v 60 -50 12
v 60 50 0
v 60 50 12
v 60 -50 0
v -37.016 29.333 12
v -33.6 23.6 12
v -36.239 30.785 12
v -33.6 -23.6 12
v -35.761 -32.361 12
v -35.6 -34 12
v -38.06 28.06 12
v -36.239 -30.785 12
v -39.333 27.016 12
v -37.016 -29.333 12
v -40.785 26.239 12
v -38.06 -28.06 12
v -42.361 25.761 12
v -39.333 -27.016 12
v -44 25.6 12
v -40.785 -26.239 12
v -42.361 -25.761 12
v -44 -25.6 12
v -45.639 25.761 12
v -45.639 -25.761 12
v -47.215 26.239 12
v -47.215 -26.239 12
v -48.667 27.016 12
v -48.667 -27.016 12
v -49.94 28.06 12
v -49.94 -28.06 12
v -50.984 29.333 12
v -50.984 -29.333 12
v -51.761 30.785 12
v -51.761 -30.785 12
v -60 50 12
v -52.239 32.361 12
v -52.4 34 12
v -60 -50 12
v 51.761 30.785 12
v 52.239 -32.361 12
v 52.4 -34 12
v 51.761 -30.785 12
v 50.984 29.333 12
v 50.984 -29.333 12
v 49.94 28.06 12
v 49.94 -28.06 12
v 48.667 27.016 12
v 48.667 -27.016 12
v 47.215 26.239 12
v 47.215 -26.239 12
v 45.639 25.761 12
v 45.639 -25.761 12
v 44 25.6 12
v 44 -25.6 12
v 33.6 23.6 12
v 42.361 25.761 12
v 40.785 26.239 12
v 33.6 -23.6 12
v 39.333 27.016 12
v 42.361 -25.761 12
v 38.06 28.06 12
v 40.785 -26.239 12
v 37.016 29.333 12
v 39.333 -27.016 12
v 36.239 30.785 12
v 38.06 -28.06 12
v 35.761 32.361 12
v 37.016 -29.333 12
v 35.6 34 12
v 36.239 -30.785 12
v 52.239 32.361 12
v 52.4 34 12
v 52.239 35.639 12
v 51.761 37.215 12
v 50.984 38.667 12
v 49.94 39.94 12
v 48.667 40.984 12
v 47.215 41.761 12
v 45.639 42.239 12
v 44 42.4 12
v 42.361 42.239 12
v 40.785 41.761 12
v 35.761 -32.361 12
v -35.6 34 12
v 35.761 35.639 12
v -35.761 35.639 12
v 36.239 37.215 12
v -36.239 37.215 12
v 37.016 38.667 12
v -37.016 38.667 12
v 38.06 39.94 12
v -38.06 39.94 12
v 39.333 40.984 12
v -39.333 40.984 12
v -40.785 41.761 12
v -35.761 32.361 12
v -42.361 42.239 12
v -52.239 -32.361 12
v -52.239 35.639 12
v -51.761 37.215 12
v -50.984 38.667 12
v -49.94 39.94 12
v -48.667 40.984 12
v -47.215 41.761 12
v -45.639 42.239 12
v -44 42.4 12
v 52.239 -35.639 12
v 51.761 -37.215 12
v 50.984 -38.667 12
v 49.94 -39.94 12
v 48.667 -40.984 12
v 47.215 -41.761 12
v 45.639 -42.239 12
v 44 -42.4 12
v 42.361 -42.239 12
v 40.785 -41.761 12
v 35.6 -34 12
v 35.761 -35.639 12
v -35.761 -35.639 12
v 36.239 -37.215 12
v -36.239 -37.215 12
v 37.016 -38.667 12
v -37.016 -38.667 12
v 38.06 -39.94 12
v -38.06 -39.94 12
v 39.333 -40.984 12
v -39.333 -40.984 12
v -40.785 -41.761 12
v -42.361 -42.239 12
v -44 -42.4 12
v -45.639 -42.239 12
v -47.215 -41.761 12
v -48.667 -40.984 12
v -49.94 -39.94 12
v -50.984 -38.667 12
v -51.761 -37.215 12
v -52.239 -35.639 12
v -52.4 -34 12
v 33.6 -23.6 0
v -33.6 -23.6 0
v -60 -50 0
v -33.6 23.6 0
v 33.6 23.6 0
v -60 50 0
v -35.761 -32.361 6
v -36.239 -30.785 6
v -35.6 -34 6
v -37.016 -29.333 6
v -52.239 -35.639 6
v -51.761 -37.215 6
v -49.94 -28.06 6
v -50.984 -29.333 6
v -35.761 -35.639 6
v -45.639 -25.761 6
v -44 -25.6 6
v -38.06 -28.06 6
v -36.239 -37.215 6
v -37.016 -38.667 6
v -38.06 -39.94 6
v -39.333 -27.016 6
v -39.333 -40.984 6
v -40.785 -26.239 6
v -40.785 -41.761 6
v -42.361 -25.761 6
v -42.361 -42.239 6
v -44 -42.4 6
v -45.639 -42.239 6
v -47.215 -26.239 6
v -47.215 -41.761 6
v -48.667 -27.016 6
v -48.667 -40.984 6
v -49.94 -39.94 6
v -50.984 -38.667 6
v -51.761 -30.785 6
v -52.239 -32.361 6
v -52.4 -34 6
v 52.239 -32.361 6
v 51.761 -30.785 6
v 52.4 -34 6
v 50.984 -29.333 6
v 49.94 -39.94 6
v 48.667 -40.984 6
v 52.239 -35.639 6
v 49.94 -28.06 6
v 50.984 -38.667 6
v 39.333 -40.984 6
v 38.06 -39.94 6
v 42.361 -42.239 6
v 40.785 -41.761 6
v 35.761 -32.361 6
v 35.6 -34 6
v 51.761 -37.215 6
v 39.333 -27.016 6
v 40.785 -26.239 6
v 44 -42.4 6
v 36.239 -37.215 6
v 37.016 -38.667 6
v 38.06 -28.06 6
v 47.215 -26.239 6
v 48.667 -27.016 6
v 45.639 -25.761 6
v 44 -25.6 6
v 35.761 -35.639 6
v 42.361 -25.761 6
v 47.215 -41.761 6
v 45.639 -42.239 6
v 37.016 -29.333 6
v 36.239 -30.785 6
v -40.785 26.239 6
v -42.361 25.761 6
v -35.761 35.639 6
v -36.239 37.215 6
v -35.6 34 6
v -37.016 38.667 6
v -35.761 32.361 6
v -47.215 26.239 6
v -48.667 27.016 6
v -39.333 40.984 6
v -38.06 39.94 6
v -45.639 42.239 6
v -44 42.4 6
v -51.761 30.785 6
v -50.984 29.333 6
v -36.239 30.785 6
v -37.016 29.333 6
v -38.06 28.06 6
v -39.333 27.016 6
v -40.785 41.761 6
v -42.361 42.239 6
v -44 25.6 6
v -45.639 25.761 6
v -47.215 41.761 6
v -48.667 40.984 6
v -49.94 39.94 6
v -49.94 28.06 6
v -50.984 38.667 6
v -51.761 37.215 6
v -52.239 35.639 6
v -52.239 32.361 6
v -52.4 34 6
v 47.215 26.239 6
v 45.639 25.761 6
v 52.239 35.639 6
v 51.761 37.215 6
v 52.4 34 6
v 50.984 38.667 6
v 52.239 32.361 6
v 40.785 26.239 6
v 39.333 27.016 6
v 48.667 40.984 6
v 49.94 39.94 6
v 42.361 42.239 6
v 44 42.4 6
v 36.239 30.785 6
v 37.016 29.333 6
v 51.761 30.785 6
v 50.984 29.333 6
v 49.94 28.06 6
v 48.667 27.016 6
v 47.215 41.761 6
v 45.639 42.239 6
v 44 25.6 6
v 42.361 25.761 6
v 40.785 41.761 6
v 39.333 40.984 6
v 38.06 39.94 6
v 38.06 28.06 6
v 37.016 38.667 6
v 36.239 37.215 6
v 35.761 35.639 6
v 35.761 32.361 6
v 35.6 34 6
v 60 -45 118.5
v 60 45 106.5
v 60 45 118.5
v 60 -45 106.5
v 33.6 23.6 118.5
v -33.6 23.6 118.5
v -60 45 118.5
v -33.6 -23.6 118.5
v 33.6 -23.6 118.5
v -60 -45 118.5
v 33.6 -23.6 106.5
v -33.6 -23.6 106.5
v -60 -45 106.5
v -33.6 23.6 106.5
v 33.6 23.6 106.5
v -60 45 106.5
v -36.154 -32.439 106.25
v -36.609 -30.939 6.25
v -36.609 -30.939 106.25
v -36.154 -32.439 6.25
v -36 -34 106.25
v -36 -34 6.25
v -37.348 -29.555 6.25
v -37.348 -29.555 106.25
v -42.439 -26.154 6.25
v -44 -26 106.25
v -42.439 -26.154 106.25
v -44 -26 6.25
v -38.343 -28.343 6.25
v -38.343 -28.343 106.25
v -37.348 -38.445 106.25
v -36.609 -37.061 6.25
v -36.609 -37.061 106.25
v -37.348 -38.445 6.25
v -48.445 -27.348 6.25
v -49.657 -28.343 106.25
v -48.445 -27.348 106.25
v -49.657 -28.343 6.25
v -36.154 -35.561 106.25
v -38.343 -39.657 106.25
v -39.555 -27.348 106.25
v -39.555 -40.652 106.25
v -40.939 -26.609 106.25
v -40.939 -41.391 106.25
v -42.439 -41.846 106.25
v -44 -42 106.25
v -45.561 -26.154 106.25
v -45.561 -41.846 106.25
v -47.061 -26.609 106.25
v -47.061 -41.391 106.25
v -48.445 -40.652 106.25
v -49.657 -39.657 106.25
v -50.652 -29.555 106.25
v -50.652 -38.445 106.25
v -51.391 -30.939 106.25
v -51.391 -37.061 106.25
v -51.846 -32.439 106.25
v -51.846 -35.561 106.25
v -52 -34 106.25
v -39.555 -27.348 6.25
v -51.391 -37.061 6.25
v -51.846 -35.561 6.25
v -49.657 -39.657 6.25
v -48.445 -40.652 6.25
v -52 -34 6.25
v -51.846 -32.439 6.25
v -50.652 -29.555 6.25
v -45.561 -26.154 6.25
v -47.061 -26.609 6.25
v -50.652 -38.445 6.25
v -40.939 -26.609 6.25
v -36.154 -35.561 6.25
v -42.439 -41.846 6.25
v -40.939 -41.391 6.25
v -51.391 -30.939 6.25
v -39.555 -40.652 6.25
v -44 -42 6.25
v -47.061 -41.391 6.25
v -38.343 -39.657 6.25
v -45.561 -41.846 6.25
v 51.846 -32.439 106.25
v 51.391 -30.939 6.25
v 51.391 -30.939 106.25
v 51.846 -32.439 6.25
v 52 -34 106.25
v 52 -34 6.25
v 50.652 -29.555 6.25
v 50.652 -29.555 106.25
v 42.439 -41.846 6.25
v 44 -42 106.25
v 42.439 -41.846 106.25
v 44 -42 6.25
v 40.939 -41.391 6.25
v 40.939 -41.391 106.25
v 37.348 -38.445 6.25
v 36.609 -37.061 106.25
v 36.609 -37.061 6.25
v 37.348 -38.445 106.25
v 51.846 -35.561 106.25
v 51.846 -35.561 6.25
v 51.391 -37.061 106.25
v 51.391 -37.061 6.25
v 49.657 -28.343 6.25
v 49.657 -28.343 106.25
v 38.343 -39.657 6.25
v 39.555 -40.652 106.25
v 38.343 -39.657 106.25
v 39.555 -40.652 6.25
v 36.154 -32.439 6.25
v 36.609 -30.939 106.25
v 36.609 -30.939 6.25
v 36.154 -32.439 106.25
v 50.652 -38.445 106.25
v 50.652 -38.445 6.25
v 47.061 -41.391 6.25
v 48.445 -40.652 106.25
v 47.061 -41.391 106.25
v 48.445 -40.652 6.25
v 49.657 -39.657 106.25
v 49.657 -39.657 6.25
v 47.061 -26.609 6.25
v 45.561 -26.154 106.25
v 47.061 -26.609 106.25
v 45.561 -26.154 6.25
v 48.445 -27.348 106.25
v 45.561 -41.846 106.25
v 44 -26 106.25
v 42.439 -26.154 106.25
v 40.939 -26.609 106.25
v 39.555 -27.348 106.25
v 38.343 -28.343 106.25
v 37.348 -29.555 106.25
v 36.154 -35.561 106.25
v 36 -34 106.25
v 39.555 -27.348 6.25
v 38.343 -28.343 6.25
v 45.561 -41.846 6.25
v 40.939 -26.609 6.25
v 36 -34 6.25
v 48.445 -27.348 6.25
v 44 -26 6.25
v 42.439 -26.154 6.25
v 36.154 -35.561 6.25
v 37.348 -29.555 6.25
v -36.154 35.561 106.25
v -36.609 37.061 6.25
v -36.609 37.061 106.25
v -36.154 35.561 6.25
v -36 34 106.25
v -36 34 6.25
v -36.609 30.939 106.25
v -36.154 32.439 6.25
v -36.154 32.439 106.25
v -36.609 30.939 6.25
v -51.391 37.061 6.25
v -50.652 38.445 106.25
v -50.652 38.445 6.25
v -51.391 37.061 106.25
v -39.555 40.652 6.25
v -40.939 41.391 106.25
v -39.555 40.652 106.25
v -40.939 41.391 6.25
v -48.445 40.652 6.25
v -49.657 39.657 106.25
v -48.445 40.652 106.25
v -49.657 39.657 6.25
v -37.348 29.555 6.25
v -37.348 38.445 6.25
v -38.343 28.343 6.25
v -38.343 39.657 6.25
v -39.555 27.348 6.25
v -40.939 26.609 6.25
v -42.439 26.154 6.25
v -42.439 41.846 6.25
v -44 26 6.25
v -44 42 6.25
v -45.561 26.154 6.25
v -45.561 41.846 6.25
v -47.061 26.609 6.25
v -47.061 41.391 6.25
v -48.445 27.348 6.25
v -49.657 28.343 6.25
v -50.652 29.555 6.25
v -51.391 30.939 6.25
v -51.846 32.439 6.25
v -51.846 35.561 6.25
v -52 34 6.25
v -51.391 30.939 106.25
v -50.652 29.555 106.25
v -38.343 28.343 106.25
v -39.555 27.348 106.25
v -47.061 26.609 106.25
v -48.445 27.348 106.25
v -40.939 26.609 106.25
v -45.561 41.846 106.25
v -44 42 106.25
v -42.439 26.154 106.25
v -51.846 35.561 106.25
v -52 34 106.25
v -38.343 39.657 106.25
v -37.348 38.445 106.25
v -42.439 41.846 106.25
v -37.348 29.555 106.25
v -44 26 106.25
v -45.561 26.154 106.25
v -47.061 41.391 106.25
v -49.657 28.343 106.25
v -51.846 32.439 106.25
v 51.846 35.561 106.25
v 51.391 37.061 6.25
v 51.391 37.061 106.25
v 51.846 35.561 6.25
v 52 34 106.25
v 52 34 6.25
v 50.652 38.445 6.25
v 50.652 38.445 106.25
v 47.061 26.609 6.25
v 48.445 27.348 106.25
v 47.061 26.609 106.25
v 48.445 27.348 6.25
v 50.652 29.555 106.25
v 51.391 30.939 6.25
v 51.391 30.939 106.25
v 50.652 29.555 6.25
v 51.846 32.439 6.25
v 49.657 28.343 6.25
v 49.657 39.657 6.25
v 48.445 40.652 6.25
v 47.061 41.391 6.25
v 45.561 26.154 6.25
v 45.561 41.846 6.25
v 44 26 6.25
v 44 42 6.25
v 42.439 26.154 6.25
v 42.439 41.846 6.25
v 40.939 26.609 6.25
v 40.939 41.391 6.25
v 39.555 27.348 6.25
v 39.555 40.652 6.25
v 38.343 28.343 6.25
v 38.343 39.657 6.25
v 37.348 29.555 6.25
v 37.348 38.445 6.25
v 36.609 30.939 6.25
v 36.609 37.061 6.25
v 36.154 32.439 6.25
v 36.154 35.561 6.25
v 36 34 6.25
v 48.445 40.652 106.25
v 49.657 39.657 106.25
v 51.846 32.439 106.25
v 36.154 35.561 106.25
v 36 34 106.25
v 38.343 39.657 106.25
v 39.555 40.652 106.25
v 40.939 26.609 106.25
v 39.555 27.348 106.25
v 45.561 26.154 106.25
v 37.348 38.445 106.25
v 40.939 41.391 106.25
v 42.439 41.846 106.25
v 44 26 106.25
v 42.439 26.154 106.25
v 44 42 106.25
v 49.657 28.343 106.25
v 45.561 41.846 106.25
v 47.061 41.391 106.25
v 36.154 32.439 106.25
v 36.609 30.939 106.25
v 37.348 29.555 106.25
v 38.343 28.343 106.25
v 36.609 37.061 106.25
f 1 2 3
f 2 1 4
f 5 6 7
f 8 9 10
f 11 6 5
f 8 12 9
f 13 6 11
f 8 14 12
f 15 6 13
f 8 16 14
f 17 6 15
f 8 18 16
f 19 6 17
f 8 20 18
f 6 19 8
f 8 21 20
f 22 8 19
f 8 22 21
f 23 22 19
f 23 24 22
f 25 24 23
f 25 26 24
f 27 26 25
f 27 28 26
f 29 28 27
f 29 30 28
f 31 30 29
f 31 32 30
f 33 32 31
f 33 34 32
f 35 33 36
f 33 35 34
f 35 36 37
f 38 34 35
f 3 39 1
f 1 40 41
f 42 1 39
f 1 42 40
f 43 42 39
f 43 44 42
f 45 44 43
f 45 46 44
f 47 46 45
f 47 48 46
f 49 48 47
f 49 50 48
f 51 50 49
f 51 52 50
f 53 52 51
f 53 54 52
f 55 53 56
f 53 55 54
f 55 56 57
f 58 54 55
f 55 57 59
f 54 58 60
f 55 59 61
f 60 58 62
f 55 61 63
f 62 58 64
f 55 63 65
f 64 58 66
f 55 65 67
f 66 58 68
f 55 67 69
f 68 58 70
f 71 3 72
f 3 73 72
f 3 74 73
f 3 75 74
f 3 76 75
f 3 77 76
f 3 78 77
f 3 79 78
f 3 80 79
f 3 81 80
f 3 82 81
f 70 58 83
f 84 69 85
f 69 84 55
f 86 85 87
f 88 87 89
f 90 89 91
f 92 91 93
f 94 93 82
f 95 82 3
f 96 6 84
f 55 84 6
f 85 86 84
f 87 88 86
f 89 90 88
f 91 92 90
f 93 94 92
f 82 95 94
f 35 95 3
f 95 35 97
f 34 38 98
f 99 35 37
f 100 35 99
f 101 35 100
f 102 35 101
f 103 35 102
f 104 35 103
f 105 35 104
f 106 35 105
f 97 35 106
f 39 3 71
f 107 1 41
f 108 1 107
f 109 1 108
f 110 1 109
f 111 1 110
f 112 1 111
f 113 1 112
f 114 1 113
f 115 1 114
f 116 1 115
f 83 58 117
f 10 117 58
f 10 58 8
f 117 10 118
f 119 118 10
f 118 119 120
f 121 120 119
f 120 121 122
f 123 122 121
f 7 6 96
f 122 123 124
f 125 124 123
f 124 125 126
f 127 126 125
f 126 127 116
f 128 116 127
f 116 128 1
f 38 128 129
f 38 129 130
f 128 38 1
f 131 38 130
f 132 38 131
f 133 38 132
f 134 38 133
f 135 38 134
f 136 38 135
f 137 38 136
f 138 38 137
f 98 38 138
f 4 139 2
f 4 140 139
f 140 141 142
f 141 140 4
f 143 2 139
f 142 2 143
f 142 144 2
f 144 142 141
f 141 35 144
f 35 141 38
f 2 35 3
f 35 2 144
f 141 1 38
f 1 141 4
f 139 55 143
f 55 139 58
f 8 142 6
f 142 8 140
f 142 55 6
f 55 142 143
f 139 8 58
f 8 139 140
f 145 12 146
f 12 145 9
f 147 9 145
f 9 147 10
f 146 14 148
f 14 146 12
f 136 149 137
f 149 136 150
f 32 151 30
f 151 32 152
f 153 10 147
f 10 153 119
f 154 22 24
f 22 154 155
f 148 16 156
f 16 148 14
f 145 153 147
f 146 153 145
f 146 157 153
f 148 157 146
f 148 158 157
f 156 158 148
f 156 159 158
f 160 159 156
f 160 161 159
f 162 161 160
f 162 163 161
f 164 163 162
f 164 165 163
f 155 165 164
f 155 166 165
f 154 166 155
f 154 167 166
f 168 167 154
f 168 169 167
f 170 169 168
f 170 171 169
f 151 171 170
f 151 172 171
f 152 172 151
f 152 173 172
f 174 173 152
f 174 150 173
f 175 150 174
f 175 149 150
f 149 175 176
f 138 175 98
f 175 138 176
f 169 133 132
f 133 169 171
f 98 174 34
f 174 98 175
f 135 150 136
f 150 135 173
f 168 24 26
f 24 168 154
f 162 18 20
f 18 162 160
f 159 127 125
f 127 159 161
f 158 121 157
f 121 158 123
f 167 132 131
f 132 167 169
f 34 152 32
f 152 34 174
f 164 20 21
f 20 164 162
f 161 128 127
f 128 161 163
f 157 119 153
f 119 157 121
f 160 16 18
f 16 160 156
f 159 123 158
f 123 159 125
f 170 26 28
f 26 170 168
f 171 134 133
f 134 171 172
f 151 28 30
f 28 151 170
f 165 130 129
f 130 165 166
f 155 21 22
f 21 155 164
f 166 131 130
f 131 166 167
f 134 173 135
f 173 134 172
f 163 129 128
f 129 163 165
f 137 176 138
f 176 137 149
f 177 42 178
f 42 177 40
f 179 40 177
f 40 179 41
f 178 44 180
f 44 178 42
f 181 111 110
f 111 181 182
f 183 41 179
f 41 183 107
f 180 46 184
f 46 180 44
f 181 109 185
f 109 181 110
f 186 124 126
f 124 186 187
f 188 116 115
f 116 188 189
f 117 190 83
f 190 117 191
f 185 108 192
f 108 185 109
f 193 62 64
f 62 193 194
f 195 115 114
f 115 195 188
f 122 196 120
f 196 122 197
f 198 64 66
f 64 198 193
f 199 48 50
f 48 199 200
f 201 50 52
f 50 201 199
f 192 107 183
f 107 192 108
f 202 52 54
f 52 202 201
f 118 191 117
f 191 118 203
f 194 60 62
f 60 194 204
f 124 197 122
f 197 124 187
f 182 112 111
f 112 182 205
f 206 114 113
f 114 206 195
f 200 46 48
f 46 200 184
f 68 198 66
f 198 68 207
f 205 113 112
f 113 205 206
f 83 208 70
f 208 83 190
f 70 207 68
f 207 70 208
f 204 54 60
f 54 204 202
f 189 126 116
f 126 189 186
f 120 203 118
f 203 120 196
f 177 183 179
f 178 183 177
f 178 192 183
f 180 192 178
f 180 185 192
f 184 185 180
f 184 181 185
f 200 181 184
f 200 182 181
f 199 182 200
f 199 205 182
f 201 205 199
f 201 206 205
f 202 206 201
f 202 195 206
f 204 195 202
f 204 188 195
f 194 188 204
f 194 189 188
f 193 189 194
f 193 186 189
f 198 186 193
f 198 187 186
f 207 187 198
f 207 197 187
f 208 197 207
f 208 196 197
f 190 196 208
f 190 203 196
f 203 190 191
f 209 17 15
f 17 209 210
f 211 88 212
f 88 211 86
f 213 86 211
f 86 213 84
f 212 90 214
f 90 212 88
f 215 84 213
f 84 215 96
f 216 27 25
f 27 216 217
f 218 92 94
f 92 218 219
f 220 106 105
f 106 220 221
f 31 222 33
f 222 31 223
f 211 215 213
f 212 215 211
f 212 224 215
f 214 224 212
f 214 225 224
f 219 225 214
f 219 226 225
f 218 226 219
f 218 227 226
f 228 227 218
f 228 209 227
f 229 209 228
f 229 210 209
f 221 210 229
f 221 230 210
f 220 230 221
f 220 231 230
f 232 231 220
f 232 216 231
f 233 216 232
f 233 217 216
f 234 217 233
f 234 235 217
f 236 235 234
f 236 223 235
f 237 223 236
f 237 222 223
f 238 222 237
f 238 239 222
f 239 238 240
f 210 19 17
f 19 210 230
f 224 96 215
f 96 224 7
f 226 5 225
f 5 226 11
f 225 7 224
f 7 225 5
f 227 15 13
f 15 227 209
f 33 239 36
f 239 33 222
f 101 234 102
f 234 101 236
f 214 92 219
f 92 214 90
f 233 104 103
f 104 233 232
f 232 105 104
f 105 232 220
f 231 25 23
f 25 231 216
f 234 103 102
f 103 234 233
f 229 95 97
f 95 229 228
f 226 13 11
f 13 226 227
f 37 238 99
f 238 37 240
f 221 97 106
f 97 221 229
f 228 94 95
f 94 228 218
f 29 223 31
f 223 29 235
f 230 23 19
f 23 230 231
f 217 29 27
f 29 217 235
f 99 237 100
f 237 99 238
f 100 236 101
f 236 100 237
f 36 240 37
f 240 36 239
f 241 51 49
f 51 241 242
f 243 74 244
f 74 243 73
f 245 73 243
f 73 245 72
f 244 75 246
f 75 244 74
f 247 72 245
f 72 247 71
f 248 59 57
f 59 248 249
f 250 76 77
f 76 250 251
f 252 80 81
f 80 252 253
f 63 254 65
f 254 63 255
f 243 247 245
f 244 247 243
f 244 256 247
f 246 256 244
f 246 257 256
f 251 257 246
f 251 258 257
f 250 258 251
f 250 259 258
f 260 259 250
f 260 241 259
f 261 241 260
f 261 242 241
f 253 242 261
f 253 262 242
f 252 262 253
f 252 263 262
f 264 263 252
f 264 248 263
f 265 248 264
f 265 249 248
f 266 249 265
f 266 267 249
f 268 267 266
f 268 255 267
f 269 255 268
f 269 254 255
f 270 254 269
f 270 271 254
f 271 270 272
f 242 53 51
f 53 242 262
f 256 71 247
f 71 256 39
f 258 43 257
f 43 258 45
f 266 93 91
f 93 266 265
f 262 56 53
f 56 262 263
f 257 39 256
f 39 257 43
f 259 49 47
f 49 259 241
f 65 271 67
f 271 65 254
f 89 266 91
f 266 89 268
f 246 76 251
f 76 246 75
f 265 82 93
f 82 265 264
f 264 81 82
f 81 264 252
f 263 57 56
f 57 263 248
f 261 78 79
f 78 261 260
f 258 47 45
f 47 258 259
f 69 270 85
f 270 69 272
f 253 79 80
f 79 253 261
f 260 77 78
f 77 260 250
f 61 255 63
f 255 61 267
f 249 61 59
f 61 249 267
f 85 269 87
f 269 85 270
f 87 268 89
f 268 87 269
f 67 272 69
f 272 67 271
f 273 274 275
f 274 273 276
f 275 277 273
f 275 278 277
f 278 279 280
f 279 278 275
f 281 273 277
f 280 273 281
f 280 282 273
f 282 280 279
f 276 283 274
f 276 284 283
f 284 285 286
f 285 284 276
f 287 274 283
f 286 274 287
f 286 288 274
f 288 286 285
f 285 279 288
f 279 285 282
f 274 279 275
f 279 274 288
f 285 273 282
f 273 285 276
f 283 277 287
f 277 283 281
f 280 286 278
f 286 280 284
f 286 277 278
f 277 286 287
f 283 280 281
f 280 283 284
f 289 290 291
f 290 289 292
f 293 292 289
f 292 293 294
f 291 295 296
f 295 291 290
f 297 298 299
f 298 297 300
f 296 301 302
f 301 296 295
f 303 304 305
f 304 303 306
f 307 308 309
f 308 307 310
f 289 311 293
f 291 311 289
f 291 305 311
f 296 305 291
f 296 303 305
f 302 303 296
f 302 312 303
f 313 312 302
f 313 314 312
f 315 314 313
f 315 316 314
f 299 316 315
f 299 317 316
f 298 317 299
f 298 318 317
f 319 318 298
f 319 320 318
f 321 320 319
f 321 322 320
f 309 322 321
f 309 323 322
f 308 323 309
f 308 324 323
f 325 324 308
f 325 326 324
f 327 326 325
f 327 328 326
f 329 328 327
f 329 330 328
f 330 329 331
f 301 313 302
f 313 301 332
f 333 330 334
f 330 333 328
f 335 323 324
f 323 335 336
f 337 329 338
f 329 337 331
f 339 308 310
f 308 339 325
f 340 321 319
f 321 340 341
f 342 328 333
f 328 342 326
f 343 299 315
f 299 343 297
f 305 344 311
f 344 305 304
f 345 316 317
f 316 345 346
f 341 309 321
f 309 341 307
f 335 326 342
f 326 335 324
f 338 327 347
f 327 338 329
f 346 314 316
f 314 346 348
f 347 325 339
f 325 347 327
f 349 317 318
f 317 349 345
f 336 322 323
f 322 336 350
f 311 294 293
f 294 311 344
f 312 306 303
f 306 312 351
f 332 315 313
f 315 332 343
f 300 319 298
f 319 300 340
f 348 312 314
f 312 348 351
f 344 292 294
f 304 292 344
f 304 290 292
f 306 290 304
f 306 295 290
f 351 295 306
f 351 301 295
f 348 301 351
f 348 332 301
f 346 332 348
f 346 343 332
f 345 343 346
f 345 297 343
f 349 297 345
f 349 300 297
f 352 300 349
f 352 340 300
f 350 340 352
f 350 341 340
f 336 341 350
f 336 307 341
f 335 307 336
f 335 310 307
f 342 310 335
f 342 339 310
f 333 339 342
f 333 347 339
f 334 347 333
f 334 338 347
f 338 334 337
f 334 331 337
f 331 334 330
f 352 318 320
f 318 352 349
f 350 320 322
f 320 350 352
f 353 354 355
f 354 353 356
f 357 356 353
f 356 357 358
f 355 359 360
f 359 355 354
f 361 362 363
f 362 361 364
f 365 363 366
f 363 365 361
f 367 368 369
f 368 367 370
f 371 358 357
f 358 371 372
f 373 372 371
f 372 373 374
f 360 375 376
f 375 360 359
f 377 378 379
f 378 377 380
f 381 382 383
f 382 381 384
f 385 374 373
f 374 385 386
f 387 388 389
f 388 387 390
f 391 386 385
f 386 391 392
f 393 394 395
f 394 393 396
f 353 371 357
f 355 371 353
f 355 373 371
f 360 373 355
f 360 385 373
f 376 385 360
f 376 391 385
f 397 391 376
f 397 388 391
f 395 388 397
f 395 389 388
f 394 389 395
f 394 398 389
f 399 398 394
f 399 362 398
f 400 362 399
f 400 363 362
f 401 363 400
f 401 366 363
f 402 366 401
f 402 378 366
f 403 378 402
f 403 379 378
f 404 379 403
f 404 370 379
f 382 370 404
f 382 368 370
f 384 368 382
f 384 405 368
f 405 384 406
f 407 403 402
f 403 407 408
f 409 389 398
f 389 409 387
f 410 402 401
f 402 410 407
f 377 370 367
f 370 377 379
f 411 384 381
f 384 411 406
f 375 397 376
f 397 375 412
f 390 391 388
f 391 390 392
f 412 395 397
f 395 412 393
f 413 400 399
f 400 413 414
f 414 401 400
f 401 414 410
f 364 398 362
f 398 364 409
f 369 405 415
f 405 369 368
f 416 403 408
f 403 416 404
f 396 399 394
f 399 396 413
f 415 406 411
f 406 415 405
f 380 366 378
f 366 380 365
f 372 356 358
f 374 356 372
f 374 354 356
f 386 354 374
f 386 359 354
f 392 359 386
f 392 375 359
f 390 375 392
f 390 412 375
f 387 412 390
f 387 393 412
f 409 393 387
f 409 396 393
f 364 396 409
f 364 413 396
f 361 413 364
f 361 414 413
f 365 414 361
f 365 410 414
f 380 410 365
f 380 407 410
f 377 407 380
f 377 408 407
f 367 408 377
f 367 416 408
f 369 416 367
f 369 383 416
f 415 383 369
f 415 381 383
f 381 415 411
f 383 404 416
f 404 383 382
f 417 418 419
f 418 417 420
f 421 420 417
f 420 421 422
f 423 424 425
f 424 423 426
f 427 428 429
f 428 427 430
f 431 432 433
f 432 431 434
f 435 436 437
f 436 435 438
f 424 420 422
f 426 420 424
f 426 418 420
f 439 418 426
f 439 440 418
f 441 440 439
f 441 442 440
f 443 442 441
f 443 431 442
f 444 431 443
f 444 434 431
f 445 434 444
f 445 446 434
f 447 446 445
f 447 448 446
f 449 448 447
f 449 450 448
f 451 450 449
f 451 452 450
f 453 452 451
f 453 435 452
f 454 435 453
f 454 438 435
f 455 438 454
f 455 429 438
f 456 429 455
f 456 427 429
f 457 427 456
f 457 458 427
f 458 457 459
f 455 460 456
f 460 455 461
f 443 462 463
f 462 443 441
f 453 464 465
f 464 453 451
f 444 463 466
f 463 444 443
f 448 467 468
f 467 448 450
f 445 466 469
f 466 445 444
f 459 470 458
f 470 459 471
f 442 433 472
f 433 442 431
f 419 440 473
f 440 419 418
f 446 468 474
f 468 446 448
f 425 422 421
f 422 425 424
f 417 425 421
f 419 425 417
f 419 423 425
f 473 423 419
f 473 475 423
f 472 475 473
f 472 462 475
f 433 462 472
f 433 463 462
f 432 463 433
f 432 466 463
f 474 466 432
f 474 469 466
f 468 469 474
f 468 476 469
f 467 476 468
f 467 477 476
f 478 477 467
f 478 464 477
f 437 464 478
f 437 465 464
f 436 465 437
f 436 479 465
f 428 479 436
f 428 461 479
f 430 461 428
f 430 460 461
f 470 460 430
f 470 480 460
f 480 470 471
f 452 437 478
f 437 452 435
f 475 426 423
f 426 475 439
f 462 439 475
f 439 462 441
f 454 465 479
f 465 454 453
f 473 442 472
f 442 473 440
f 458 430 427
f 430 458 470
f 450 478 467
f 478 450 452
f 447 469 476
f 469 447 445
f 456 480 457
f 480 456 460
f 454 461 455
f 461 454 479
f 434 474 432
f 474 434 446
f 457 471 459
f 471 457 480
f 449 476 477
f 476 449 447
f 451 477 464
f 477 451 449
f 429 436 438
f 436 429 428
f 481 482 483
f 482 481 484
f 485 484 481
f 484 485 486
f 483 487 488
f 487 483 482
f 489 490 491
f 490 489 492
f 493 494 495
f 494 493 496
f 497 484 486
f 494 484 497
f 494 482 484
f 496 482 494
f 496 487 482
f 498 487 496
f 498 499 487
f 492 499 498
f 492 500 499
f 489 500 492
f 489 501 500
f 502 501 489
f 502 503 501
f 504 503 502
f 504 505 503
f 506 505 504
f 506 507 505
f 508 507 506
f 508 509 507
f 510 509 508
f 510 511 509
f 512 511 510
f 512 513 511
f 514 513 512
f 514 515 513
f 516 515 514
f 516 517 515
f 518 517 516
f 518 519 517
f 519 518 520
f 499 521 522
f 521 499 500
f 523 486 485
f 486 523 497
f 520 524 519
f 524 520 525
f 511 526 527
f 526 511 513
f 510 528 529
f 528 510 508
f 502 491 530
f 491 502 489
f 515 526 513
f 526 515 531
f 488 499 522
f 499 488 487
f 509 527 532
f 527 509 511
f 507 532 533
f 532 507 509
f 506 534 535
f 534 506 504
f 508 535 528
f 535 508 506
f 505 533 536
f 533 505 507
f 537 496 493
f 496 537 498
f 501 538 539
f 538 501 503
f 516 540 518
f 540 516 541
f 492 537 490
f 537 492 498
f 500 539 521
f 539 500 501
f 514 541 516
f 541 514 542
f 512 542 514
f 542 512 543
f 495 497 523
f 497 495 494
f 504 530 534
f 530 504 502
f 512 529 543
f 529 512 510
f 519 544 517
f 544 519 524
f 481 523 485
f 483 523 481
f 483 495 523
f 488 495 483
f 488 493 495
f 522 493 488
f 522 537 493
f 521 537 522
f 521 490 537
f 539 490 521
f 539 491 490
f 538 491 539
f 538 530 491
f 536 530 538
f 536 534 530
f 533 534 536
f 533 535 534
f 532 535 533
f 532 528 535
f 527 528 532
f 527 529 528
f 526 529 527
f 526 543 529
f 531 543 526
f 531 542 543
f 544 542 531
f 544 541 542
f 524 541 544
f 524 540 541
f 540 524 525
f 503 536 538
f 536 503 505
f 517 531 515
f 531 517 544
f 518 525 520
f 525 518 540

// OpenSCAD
$fn = 32;

// ------------------------------------------------------------------------
// Frame cube: base 120 x 100 mm, posts 100 mm tall
// Every part is its own module, assembly() places every instance.
// ------------------------------------------------------------------------

// --- part 1 ---
module base_frame() {
  difference() {
    translate([-60, -50, 0]) cube([120, 100, 12]);
    translate([-33.6, -23.6, -1]) cube([67.2, 47.2, 14]);
    translate([-44, -34, 6]) cylinder(h = 7, d = 16.8);
    translate([44, -34, 6]) cylinder(h = 7, d = 16.8);
    translate([-44, 34, 6]) cylinder(h = 7, d = 16.8);
    translate([44, 34, 6]) cylinder(h = 7, d = 16.8);
  }
}

// --- part 2 ---
module corner_post() {
  cylinder(h = 100, d = 16);
}

// --- part 3 ---
module top_frame() {
  difference() {
    translate([-60, -45, 0]) cube([120, 90, 12]);
    translate([-33.6, -23.6, -1]) cube([67.2, 47.2, 14]);
  }
}

// --- assembly ---
module assembly() {
  color([0.80, 0.24, 0.20]) translate([0, 0, 0]) rotate([0, 0, 0]) base_frame();
  color([0.20, 0.45, 0.75]) translate([-44, -34, 6.25]) rotate([0, 0, 0]) corner_post();
  color([0.25, 0.62, 0.32]) translate([44, -34, 6.25]) rotate([0, 0, 0]) corner_post();
  color([0.92, 0.70, 0.18]) translate([-44, 34, 6.25]) rotate([0, 0, 0]) corner_post();
  color([0.58, 0.35, 0.70]) translate([44, 34, 6.25]) rotate([0, 0, 0]) corner_post();
  color([0.16, 0.66, 0.66]) translate([0, 0, 106.5]) rotate([0, 0, 0]) top_frame();
}

assembly();
